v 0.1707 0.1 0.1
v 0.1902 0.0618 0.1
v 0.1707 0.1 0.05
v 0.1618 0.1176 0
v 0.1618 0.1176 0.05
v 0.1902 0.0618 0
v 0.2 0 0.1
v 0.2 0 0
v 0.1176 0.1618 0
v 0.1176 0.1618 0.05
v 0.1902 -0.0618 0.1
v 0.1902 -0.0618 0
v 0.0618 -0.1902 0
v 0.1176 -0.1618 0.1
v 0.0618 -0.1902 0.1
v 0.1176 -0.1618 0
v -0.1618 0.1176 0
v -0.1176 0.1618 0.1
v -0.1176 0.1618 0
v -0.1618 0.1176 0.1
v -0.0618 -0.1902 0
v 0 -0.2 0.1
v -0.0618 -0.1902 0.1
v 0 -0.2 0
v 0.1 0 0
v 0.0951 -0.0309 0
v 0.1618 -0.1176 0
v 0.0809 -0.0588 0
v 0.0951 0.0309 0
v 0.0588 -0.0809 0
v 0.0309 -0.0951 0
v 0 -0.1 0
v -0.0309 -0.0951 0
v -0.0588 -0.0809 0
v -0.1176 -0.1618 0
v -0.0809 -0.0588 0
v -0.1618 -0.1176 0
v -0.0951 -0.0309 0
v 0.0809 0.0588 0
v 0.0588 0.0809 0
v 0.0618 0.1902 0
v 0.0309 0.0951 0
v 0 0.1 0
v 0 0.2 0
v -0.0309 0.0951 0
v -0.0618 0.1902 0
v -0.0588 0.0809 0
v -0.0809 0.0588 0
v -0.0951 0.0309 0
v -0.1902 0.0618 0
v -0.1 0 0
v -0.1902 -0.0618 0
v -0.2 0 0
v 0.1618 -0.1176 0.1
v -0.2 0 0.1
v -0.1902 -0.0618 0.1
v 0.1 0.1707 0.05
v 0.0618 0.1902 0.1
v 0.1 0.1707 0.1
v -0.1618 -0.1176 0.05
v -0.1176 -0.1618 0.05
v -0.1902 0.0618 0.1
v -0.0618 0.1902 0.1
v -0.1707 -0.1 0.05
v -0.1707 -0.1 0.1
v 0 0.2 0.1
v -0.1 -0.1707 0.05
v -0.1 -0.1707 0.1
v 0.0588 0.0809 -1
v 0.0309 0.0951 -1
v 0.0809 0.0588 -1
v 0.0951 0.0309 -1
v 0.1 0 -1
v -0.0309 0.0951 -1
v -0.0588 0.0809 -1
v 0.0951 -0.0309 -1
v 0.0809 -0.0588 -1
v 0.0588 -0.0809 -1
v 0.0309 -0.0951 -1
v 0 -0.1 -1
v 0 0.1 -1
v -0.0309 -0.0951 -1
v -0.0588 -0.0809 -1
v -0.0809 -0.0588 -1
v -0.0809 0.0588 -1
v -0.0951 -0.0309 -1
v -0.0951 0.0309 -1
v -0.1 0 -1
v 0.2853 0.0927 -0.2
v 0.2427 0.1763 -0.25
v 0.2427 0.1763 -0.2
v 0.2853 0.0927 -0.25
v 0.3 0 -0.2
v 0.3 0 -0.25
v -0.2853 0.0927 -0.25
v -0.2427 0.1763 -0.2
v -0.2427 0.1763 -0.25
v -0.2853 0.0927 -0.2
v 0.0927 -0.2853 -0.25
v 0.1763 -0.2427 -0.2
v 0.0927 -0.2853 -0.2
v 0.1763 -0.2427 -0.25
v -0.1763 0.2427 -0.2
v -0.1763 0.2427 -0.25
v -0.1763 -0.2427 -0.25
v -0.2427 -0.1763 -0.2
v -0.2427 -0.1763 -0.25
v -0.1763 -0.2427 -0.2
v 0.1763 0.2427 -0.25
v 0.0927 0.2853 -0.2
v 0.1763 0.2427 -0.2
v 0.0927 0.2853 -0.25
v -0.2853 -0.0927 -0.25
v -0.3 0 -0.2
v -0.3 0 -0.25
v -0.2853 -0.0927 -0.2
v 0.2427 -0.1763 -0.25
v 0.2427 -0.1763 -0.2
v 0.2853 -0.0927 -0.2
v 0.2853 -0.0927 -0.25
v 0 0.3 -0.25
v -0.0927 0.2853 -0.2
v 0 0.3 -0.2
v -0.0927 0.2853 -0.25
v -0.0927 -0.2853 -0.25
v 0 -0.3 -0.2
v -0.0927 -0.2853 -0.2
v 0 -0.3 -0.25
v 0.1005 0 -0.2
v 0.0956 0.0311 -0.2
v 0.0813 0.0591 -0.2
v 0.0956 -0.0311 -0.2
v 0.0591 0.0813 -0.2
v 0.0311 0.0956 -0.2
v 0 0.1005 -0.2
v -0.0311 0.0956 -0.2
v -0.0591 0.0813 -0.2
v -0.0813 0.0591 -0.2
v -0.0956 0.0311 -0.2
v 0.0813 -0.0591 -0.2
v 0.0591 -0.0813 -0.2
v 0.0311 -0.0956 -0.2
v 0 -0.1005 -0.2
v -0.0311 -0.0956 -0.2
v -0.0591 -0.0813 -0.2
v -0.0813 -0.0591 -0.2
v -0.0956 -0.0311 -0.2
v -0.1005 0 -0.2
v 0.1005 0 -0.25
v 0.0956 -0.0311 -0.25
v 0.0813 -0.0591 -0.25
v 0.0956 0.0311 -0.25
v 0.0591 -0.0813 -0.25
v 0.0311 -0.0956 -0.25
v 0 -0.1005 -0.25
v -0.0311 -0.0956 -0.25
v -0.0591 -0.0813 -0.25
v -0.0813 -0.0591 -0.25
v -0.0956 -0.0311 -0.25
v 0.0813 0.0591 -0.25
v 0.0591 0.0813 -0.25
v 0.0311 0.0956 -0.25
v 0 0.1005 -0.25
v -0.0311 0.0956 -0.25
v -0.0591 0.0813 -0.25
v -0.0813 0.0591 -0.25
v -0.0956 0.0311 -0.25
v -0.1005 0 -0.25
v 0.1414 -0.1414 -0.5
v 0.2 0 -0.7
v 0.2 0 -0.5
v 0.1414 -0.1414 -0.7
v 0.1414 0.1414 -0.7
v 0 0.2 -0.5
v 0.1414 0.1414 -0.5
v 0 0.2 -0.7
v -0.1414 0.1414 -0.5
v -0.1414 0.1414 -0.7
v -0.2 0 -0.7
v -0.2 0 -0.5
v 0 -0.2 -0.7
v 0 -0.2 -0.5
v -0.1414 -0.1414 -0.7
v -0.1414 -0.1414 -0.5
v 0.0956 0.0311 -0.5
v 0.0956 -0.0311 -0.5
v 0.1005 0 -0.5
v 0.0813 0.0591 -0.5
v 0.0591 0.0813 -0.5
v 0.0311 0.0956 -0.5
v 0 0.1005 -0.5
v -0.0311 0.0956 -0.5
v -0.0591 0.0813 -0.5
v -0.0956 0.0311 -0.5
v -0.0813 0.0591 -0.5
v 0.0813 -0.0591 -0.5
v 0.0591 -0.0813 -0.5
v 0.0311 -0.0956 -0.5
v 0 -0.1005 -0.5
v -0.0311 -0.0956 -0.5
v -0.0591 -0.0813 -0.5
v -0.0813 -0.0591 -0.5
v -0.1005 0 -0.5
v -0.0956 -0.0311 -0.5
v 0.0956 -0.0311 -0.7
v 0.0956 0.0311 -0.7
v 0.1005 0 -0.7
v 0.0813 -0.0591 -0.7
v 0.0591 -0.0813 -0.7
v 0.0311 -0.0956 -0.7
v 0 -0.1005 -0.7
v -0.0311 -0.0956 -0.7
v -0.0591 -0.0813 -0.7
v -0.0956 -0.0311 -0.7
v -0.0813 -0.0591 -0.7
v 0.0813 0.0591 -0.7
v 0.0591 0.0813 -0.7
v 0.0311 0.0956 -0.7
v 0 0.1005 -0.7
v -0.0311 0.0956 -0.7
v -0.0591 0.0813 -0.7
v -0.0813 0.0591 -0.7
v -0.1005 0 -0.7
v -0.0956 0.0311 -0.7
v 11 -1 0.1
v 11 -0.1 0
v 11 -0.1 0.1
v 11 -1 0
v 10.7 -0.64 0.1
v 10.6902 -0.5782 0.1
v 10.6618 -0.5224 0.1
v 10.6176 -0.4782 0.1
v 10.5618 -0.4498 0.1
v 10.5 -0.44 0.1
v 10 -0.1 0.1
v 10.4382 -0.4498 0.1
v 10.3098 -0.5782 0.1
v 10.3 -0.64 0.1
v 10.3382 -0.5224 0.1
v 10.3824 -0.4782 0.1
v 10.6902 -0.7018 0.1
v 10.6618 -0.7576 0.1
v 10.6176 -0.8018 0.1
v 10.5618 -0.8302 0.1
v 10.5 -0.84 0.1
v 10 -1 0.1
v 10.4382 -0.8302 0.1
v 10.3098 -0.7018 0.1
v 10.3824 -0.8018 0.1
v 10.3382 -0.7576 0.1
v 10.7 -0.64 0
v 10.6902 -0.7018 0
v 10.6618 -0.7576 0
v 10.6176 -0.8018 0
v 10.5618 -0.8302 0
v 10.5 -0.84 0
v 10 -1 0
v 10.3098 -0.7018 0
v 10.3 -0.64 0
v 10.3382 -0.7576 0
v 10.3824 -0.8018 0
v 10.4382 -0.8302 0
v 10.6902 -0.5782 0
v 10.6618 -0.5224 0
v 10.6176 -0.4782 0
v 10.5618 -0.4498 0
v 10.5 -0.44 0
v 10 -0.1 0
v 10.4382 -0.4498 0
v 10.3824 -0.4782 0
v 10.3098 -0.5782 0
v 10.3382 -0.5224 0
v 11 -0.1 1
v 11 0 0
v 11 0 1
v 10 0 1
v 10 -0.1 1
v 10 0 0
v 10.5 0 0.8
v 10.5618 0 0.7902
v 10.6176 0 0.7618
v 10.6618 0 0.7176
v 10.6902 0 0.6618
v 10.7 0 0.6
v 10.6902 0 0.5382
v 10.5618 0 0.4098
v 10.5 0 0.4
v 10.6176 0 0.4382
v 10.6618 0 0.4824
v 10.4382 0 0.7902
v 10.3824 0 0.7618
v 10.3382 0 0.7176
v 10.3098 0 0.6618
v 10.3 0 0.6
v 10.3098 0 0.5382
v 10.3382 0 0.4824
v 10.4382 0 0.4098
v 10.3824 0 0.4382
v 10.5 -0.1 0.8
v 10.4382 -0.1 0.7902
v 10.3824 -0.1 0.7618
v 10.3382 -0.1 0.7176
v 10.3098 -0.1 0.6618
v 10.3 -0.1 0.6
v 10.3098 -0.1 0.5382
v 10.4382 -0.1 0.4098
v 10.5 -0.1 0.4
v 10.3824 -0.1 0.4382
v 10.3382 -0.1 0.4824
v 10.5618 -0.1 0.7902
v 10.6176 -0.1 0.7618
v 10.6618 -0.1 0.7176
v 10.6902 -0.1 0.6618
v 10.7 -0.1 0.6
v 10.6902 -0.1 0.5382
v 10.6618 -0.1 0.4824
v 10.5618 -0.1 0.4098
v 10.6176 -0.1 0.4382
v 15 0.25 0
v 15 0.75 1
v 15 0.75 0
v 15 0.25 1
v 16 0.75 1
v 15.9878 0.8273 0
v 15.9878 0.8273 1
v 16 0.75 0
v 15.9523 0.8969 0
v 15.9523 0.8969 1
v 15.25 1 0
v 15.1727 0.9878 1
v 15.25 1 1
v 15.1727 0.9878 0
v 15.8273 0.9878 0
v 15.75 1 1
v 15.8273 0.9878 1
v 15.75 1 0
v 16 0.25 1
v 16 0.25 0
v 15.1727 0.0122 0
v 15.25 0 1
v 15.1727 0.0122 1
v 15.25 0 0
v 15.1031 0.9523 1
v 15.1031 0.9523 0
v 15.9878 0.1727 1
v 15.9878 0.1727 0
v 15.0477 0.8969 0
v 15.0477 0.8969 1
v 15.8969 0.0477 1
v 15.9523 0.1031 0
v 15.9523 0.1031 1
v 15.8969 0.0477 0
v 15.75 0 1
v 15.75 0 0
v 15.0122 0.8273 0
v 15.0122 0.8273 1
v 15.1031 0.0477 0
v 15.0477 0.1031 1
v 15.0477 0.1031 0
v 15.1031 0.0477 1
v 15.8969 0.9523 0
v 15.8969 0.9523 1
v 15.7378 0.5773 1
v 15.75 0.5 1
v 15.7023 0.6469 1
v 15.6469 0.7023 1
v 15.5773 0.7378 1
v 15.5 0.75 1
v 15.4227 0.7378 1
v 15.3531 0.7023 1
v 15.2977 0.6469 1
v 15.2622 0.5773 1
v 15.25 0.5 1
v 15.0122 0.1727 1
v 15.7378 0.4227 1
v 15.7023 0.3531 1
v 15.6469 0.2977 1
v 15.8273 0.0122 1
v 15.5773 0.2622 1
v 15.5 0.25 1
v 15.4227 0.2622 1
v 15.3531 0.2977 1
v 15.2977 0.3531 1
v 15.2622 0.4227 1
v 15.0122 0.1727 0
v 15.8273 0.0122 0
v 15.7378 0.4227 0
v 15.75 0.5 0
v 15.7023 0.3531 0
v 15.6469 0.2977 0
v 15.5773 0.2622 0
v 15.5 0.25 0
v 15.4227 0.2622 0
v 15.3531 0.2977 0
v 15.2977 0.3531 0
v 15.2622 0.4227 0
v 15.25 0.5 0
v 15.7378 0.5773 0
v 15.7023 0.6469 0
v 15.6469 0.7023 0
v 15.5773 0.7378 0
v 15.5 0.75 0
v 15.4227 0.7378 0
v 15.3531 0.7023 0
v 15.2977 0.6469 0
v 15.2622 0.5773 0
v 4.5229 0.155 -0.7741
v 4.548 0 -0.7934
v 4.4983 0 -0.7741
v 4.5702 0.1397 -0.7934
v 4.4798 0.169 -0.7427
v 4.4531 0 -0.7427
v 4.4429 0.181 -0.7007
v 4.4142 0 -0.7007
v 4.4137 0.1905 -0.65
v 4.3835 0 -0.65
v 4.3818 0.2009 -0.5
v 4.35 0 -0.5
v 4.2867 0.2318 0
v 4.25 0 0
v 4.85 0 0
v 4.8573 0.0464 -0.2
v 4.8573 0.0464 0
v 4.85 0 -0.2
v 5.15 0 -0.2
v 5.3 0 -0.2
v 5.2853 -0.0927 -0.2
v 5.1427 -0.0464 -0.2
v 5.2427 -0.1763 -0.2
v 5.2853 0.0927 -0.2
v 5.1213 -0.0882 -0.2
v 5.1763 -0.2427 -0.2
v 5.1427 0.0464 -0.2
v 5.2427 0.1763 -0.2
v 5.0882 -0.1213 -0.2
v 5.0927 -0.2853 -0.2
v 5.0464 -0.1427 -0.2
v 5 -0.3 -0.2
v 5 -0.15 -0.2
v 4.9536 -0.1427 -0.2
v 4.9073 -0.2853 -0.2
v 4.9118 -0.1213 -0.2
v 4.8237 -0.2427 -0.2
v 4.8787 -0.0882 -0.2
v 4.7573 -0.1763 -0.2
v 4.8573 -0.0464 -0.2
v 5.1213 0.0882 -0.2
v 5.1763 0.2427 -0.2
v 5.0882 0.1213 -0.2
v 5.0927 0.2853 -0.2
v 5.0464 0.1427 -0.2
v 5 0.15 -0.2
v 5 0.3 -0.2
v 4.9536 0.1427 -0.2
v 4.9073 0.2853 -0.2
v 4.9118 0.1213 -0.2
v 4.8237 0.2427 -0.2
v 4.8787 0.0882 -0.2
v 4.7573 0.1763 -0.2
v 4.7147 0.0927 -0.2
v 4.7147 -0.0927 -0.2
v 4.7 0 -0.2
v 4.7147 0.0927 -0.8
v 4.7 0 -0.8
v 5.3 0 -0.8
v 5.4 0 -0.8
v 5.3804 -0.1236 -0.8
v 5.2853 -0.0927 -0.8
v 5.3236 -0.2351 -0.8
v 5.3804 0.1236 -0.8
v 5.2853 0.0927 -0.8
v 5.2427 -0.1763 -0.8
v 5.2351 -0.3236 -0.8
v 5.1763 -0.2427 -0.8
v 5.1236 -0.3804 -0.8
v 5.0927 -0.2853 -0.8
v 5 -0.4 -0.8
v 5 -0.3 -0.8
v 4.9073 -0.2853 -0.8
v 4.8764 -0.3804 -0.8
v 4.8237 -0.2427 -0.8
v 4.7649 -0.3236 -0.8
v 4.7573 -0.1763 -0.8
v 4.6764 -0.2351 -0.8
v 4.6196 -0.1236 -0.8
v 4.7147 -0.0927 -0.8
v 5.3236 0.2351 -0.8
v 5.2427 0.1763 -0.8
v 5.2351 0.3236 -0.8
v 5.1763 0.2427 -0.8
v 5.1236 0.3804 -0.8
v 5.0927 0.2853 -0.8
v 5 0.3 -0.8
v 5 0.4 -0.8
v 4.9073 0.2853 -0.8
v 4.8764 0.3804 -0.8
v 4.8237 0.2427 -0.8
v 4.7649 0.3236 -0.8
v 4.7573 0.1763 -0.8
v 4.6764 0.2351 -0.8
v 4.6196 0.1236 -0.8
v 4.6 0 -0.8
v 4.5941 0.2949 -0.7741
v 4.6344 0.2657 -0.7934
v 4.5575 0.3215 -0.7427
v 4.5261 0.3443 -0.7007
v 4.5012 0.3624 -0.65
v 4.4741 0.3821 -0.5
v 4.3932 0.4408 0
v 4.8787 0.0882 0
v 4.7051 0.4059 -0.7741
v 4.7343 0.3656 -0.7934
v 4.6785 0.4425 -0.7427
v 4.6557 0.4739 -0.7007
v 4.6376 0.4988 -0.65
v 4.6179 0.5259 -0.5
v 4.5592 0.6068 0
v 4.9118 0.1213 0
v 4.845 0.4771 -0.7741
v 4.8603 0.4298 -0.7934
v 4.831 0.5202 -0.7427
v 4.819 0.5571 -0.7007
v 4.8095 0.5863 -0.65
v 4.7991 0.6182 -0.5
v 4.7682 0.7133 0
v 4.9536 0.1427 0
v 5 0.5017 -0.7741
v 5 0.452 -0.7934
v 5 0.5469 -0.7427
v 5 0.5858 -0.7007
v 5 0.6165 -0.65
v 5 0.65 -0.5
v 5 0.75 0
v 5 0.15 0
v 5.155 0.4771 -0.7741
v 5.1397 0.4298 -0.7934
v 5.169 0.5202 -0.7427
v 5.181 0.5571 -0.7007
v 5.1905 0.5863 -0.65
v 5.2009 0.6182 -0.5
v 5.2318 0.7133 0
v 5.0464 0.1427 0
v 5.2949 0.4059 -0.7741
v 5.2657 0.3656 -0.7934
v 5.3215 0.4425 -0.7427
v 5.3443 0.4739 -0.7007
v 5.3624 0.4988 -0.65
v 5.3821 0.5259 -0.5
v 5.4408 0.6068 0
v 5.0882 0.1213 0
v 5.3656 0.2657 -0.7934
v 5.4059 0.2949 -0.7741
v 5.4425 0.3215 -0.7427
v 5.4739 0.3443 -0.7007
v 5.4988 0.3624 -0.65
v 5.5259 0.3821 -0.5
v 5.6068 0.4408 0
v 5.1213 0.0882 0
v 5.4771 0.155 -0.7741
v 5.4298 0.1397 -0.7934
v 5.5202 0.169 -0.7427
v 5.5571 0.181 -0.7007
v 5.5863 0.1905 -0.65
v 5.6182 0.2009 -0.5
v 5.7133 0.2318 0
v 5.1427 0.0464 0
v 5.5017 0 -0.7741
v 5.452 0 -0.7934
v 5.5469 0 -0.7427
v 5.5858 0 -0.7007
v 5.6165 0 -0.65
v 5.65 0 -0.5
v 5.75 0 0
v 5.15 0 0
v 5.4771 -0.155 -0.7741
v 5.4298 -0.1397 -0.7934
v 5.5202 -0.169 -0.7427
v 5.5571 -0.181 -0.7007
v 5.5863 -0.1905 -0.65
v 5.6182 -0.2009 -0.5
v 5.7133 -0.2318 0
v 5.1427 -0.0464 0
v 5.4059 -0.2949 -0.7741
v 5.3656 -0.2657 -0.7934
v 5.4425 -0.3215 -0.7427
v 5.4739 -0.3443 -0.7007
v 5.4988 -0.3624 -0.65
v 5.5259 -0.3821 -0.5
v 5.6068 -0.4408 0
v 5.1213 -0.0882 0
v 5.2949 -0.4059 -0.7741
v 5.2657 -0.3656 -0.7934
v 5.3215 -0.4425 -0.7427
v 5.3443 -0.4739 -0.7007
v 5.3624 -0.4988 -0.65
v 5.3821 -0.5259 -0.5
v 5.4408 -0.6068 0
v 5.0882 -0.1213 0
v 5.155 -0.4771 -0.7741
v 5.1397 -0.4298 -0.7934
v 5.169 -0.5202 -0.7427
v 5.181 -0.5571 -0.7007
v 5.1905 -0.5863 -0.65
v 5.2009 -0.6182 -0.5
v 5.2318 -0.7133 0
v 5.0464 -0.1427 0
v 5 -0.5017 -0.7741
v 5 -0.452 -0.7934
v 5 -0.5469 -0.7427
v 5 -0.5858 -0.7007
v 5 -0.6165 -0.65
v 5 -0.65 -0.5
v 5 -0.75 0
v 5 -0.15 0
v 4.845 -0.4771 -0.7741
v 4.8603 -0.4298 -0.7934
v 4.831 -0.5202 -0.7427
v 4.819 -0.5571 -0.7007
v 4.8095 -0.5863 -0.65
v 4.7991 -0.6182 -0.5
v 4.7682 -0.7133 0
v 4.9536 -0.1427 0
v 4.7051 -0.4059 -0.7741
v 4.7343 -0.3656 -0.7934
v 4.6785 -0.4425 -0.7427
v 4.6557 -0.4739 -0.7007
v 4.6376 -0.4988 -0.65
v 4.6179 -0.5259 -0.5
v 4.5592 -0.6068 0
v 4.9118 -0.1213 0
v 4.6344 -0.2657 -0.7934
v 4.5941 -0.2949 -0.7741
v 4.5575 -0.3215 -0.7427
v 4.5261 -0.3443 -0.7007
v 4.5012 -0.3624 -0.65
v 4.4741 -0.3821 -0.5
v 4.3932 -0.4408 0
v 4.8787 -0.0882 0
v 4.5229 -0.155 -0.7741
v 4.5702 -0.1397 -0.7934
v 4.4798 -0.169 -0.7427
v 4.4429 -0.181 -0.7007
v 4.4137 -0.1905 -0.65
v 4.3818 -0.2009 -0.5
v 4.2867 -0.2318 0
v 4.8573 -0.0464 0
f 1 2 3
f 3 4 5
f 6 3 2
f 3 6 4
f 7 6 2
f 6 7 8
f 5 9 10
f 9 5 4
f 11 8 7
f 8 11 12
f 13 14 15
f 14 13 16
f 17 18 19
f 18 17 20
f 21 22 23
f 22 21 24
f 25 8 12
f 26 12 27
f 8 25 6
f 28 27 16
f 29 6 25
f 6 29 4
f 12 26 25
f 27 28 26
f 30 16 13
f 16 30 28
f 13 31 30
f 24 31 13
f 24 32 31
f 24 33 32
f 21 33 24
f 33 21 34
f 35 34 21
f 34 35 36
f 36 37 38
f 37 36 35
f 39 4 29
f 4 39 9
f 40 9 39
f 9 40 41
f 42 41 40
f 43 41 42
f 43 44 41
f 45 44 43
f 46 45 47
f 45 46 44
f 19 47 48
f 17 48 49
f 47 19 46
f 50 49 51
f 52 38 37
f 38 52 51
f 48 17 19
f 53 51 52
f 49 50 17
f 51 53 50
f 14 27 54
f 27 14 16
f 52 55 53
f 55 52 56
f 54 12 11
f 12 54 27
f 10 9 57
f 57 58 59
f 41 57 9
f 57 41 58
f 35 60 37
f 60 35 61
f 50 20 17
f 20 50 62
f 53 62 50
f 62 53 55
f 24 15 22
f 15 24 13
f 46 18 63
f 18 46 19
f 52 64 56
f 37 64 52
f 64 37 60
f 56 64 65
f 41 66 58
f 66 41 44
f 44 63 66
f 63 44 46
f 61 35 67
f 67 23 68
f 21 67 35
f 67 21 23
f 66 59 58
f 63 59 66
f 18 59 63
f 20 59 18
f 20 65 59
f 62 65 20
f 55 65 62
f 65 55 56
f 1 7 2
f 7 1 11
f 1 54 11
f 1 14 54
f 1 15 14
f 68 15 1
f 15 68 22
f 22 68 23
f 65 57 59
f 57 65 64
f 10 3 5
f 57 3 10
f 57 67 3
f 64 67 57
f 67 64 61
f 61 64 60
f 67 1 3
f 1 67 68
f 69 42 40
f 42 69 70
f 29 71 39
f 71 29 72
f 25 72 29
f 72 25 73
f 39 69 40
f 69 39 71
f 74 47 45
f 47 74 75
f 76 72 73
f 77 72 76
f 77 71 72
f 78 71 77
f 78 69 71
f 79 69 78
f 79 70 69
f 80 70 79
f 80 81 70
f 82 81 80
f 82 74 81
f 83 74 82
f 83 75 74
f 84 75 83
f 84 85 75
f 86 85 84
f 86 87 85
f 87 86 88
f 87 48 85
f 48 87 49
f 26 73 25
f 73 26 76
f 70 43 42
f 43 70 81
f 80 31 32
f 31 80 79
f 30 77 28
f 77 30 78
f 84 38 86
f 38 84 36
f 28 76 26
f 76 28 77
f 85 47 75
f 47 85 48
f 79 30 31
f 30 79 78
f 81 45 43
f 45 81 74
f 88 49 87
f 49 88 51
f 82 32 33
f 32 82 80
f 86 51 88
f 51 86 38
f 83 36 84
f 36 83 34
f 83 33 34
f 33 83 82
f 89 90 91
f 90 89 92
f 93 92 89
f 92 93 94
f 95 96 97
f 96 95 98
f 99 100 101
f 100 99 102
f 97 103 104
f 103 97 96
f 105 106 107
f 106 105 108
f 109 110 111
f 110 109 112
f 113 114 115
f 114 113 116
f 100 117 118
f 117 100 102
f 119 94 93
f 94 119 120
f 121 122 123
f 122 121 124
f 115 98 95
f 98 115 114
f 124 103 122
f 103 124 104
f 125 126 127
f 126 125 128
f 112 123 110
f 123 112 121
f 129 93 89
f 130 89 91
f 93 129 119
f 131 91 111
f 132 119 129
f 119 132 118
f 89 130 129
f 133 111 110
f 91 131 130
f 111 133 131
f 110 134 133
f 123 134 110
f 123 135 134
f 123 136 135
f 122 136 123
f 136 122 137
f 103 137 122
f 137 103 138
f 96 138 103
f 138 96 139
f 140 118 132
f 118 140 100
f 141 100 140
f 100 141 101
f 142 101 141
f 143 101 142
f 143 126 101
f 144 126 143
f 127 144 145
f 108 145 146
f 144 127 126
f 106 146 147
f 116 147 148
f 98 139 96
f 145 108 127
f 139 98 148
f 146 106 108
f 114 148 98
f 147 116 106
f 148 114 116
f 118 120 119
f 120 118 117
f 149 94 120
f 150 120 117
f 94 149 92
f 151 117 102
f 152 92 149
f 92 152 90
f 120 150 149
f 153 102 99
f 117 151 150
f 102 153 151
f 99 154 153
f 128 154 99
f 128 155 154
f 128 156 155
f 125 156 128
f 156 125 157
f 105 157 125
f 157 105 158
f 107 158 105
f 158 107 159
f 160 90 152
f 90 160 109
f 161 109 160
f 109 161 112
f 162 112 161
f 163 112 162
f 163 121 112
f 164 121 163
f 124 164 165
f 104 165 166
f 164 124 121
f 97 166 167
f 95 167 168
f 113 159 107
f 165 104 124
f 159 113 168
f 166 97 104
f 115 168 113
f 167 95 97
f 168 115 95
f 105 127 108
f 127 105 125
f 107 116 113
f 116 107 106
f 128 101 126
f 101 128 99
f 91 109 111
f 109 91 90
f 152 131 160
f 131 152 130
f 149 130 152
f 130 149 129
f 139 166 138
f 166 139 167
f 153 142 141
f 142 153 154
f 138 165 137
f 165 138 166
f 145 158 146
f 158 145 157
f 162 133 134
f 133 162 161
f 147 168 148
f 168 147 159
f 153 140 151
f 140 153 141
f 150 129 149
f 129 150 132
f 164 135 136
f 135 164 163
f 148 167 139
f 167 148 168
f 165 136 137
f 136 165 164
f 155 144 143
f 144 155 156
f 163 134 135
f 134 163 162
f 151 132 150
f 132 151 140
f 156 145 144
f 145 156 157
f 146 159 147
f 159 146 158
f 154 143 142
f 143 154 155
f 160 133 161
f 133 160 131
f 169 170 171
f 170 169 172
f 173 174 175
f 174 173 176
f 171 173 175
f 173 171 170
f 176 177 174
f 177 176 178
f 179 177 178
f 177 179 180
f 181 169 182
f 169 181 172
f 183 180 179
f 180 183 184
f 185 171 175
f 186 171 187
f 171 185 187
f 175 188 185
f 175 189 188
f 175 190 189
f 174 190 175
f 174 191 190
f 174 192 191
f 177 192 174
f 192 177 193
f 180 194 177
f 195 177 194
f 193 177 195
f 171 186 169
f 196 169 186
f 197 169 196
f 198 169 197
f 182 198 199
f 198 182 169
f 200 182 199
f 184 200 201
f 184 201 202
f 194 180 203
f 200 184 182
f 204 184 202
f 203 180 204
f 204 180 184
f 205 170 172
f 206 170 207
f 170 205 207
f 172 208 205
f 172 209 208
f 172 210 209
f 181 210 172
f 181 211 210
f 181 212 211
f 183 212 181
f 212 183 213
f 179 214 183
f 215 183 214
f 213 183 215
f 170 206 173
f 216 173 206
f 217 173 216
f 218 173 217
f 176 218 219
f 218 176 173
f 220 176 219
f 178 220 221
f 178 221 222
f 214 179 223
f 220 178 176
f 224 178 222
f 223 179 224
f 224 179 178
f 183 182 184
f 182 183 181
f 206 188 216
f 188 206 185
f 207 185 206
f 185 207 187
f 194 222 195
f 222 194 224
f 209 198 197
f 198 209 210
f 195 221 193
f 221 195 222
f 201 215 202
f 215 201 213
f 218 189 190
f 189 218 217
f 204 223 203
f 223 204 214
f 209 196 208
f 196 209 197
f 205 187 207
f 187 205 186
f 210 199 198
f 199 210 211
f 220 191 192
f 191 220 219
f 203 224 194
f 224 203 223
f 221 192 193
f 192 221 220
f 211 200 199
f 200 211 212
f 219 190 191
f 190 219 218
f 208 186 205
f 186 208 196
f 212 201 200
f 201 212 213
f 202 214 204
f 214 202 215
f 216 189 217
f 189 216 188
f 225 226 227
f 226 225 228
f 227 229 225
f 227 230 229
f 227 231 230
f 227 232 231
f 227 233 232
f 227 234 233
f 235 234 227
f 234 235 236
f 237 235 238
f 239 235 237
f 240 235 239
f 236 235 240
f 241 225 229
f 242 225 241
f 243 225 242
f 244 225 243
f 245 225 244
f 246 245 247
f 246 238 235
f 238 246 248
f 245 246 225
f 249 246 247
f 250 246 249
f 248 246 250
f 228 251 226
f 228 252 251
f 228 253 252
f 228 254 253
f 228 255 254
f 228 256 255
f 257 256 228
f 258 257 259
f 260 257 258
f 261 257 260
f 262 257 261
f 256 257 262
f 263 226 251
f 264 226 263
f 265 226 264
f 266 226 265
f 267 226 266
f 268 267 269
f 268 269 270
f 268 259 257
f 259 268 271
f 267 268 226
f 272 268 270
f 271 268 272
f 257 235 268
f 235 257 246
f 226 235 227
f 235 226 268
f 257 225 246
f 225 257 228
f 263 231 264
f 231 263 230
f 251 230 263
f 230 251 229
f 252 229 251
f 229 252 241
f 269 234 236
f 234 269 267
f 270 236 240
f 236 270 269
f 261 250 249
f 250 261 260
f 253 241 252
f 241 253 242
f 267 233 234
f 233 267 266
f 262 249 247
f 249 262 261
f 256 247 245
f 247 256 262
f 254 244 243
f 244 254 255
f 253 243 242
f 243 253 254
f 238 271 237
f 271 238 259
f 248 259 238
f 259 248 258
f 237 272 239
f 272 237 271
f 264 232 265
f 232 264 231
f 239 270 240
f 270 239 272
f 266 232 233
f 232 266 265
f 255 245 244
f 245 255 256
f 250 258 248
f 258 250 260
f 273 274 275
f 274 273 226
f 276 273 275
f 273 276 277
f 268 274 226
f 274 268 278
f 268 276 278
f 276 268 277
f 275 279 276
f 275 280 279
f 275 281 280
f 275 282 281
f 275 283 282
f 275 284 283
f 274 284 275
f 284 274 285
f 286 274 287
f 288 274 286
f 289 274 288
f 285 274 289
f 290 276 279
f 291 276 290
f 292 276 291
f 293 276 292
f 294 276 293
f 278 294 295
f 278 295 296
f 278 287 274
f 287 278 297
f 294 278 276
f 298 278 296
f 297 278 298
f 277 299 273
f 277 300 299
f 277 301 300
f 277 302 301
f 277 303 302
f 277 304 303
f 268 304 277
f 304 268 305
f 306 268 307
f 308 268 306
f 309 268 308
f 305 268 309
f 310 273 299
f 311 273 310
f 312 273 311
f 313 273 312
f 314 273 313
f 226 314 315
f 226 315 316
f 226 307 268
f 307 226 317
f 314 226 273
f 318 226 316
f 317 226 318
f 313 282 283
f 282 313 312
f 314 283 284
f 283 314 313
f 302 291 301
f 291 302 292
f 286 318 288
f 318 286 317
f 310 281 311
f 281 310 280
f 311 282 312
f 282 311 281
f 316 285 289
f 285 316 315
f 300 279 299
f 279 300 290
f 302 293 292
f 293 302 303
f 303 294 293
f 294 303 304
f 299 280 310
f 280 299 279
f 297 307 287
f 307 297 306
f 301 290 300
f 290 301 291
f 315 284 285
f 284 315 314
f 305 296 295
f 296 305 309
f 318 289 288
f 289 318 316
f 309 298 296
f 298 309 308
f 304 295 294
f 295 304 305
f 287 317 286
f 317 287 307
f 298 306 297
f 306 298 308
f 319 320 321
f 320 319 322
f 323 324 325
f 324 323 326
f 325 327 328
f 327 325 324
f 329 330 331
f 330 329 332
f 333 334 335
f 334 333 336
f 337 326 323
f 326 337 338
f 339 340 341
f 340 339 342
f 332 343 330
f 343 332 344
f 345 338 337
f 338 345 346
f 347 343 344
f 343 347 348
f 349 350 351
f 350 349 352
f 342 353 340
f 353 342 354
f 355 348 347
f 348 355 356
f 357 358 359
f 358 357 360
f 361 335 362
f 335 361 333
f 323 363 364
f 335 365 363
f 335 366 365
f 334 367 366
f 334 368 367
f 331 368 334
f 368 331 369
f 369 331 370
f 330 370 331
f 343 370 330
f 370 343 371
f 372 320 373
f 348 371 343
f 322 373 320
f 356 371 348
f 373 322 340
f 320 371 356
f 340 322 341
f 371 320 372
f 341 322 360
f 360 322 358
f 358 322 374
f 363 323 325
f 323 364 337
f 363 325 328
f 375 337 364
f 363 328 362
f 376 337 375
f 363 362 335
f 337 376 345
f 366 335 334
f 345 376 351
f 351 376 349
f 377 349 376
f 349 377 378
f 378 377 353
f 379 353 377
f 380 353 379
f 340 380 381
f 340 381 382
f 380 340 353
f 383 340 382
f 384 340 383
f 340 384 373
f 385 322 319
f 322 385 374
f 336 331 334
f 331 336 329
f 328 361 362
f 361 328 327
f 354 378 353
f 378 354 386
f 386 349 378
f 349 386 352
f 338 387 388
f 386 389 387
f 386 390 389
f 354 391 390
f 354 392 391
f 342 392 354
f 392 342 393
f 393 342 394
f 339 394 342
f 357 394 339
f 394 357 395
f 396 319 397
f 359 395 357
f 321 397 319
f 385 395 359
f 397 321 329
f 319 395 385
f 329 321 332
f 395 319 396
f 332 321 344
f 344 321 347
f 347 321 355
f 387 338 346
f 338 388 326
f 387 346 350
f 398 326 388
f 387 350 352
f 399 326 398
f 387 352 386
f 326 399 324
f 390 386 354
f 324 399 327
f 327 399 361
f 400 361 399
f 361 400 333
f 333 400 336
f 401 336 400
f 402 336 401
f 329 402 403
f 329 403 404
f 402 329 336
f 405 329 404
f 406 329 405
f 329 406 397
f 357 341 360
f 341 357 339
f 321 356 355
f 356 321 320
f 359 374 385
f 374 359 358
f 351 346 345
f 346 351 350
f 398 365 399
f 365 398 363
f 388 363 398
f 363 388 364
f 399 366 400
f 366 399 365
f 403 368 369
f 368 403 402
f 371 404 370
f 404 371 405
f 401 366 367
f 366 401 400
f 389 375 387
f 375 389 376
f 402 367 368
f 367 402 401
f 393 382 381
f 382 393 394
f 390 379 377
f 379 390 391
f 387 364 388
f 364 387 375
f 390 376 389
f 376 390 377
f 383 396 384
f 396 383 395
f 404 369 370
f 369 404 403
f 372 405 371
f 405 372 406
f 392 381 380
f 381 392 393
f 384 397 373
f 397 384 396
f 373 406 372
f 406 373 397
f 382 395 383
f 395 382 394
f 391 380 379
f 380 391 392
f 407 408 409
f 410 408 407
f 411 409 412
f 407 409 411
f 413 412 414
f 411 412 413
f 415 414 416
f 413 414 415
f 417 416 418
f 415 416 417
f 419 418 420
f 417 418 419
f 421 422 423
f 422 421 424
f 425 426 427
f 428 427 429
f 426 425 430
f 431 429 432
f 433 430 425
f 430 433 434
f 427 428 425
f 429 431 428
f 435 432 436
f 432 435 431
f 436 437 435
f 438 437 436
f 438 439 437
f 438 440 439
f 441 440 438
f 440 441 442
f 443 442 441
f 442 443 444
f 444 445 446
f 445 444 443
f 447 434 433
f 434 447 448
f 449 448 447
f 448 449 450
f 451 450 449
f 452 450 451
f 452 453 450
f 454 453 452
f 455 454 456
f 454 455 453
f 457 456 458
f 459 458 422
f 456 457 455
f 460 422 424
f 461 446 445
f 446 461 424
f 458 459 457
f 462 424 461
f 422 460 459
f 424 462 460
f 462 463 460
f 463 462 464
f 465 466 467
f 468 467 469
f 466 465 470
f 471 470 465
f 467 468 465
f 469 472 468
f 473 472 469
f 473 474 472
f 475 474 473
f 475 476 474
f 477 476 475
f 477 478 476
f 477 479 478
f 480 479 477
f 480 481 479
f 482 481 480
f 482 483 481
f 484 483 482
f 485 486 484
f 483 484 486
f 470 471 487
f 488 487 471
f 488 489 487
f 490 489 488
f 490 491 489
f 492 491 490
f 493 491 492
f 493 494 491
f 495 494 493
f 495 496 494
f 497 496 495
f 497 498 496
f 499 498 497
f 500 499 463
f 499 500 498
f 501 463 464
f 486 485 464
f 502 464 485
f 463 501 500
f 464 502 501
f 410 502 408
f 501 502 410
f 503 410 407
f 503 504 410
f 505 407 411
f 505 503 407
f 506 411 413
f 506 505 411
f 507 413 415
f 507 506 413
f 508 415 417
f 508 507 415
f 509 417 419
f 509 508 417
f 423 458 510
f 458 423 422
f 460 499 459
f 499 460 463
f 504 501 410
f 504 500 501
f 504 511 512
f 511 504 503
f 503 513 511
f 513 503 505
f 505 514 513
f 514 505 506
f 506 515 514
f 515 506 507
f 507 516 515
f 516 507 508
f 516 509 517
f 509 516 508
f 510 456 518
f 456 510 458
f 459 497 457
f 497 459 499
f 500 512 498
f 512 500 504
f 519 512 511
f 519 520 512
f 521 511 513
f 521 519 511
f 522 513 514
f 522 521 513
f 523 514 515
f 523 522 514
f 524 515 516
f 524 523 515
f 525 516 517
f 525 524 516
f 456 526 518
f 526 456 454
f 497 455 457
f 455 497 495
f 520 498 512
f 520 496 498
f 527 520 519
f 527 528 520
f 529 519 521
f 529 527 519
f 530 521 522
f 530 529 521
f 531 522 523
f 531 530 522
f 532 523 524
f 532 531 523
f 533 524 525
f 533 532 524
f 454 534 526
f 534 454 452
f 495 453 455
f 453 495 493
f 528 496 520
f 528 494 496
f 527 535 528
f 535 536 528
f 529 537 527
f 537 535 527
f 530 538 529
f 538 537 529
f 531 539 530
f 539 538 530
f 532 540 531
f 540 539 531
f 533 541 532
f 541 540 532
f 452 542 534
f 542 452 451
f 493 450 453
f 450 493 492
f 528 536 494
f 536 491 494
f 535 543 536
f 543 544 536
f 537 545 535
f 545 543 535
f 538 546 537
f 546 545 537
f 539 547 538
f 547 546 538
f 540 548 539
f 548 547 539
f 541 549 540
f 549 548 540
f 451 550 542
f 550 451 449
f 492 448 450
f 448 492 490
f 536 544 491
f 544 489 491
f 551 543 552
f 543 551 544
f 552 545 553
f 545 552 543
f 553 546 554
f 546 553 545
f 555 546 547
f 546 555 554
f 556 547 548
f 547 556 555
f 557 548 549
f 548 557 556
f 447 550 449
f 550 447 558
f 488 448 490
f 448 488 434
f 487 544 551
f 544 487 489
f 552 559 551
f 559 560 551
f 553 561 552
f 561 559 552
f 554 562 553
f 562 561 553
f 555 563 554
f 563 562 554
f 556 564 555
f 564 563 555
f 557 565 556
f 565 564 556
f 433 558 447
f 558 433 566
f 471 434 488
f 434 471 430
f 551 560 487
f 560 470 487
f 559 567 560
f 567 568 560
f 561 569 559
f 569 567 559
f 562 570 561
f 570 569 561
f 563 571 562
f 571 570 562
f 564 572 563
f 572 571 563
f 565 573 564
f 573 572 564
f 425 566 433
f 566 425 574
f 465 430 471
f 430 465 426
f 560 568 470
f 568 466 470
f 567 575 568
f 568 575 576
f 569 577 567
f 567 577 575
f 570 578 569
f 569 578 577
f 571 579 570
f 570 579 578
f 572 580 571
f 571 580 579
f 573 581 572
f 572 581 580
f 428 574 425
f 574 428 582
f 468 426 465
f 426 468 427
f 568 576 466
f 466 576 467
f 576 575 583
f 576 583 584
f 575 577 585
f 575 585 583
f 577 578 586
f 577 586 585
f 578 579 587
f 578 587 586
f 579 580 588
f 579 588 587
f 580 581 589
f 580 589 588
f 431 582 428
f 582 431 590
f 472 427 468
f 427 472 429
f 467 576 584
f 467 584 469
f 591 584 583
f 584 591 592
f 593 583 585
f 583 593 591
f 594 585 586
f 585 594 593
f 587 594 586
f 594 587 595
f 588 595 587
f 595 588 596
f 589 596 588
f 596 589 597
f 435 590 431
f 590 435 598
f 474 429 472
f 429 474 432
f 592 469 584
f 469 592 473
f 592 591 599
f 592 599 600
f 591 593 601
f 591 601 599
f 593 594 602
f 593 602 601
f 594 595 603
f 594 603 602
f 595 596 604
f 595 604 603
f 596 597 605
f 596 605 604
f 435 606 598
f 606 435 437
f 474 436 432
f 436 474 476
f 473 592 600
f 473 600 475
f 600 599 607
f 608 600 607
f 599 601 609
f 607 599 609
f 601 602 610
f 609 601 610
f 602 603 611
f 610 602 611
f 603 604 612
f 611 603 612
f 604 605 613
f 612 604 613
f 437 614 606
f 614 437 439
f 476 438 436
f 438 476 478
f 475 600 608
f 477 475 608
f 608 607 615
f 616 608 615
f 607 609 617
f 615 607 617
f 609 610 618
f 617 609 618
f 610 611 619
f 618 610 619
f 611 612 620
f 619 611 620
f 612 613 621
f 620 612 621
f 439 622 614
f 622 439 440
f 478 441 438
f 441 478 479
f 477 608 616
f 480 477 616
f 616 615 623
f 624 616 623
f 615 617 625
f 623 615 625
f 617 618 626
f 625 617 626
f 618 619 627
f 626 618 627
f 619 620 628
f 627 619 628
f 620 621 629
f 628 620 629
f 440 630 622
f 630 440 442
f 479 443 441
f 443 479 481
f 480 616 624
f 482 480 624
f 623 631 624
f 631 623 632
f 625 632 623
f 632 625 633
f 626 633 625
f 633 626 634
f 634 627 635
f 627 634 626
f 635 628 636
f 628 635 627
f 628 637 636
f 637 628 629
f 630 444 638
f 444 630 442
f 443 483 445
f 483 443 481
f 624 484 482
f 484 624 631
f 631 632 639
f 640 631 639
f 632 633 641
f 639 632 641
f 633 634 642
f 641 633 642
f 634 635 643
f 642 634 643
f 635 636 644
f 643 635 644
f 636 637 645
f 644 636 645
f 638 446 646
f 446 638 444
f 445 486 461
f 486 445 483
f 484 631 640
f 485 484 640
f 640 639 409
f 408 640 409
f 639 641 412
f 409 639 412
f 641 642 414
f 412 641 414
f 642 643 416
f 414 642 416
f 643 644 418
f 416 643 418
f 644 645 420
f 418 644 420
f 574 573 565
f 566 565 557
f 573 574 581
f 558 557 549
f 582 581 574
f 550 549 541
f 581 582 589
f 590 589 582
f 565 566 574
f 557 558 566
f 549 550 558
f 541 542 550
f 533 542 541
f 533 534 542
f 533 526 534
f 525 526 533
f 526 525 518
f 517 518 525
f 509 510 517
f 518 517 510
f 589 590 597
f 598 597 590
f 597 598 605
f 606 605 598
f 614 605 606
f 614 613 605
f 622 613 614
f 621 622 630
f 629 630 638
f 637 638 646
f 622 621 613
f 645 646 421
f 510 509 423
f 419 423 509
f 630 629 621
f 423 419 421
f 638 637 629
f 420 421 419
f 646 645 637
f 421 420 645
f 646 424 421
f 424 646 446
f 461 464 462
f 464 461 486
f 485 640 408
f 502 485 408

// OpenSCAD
module screw(h, d)
{
    color("silver") difference()
    {
        cylinder(d = d + 0.2, h = d / 2);
        rotate([0, 0, 45]) translate([-d, -0.05, d / 4]) cube(size = [d * 2, 0.1, d / 4 + 0.001]);
    }
    color("silver") translate([0, 0, -h]) cylinder(d = d, h = h);  
}

module washer(d)
{
    color("silver") translate([0, 0, -0.05]) difference()
    {
        cylinder(d = d + 0.4, h = 0.05);
        translate([0, 0, -0.1]) cylinder(d = d + 0.001, h = 0.3);
    }
}

module nut(h, d, solid_holes = 0)
{
    if(solid_holes) {
        translate([0, 0, -h - 5]) cylinder(d = d, h = 10 + h);
    }
    else {
        color("gold") translate([0, 0, -h]) difference()
        {
            cylinder(d = d * 2, h = h, $fn = 8);
            translate([0, 0, -0.1]) cylinder(d = d + 0.001, h = h + 0.2);
        }
    }
}

module foot(solid_holes = 0)
{
    if(solid_holes) {
        cylinder(d = 0.6, h = 2);
    }
    else {
        n = min(60 / ($fn / 4), 45);
        a = [[0.15, 0], [0.75, 0], [0.65, -0.5]];
        b = [for (a = [30: n: 90]) [0.4 + 0.25 * cos(-a), -0.5 + 0.30 * sin(-a)]]; //[[0.4 + 0.25 * cos(-22), -0.5 + 0.30 * sin(-22)], [0.4 + 0.25 * cos(-45), -0.5 + 0.30 * sin(-45)], [0.4 + 0.25 * cos(-67), -0.5 + 0.30 * sin(-67)]];
        c = [[0.4, -0.8], [0.3, -0.8], [0.3, -0.2], [0.15, -0.2]];
        color("black") rotate_extrude() polygon(points = concat(a, b, c));
    }
}

module bracketL(size = [1, 1, 1], d = 0.4, solid_holes = 0)
{
    if(solid_holes) {
        translate([size[0] / 2, -size[1] + (size[1] - 0.1) * 0.4, -2]) cylinder(d = d, h = 2.5);
        translate([size[0] / 2, 2, size[2] * 0.6]) rotate([90, 0, 0]) cylinder(d = d, h = 2.5);
    }
    else {
        color("silver") translate([0, -size[1], 0]) difference()
        {
             cube([size[0], size[1] - 0.1, 0.1]);
             translate([size[0] / 2, (size[1] - 0.1) * 0.4, -0.1]) cylinder(h = 0.3, d = d);
        }
        color("silver") translate([0, -0.1, 0]) difference()
        {
            cube([size[0], 0.1, size[2]]);
            translate([size[0] / 2, 0.2, size[2] * 0.6]) rotate([90, 0, 0]) cylinder(h = 0.3, d = d);
        }
    }
}

module rcube(size = [1, 1, 1], radius = 0.1)
{
    if(radius == 0)
    {
        cube(size);
    }
    else
    {
        translate([radius / 2, radius / 2, 0]) minkowski()
        {
            cylinder(d = radius, h = size[2] / 2);
            cube([size[0] - radius, size[1] - radius, size[2] / 2]);
        }
    }
}

module tube(size = [1, 1, 1], radius = 0.5, solid_holes = 0)
{
    if(solid_holes) {
        translate([size[0] / 2, size[1] / 2, -2]) cylinder(d = radius, h = size[2] + 4);
    }
    else {
        color("silver") difference()
        {
            rcube(size, radius);
            translate([size[0] / 2, size[1] / 2, -0.1]) cylinder(d = radius, h = size[2] + 0.2);
        }
    }
}

module test()
{
    $fn = 20;
    translate([0, 0, 0])
    {
        screw(1, 0.2);
        translate([0, 0, -0.2]) washer(0.2);
        translate([0, 0, -0.5]) nut(0.2, 0.2);
    }
    translate([5, 0, 0]) foot();
    translate([10, 0, 0]) bracketL();
    translate([15, 0, 0]) tube();
}

test();
